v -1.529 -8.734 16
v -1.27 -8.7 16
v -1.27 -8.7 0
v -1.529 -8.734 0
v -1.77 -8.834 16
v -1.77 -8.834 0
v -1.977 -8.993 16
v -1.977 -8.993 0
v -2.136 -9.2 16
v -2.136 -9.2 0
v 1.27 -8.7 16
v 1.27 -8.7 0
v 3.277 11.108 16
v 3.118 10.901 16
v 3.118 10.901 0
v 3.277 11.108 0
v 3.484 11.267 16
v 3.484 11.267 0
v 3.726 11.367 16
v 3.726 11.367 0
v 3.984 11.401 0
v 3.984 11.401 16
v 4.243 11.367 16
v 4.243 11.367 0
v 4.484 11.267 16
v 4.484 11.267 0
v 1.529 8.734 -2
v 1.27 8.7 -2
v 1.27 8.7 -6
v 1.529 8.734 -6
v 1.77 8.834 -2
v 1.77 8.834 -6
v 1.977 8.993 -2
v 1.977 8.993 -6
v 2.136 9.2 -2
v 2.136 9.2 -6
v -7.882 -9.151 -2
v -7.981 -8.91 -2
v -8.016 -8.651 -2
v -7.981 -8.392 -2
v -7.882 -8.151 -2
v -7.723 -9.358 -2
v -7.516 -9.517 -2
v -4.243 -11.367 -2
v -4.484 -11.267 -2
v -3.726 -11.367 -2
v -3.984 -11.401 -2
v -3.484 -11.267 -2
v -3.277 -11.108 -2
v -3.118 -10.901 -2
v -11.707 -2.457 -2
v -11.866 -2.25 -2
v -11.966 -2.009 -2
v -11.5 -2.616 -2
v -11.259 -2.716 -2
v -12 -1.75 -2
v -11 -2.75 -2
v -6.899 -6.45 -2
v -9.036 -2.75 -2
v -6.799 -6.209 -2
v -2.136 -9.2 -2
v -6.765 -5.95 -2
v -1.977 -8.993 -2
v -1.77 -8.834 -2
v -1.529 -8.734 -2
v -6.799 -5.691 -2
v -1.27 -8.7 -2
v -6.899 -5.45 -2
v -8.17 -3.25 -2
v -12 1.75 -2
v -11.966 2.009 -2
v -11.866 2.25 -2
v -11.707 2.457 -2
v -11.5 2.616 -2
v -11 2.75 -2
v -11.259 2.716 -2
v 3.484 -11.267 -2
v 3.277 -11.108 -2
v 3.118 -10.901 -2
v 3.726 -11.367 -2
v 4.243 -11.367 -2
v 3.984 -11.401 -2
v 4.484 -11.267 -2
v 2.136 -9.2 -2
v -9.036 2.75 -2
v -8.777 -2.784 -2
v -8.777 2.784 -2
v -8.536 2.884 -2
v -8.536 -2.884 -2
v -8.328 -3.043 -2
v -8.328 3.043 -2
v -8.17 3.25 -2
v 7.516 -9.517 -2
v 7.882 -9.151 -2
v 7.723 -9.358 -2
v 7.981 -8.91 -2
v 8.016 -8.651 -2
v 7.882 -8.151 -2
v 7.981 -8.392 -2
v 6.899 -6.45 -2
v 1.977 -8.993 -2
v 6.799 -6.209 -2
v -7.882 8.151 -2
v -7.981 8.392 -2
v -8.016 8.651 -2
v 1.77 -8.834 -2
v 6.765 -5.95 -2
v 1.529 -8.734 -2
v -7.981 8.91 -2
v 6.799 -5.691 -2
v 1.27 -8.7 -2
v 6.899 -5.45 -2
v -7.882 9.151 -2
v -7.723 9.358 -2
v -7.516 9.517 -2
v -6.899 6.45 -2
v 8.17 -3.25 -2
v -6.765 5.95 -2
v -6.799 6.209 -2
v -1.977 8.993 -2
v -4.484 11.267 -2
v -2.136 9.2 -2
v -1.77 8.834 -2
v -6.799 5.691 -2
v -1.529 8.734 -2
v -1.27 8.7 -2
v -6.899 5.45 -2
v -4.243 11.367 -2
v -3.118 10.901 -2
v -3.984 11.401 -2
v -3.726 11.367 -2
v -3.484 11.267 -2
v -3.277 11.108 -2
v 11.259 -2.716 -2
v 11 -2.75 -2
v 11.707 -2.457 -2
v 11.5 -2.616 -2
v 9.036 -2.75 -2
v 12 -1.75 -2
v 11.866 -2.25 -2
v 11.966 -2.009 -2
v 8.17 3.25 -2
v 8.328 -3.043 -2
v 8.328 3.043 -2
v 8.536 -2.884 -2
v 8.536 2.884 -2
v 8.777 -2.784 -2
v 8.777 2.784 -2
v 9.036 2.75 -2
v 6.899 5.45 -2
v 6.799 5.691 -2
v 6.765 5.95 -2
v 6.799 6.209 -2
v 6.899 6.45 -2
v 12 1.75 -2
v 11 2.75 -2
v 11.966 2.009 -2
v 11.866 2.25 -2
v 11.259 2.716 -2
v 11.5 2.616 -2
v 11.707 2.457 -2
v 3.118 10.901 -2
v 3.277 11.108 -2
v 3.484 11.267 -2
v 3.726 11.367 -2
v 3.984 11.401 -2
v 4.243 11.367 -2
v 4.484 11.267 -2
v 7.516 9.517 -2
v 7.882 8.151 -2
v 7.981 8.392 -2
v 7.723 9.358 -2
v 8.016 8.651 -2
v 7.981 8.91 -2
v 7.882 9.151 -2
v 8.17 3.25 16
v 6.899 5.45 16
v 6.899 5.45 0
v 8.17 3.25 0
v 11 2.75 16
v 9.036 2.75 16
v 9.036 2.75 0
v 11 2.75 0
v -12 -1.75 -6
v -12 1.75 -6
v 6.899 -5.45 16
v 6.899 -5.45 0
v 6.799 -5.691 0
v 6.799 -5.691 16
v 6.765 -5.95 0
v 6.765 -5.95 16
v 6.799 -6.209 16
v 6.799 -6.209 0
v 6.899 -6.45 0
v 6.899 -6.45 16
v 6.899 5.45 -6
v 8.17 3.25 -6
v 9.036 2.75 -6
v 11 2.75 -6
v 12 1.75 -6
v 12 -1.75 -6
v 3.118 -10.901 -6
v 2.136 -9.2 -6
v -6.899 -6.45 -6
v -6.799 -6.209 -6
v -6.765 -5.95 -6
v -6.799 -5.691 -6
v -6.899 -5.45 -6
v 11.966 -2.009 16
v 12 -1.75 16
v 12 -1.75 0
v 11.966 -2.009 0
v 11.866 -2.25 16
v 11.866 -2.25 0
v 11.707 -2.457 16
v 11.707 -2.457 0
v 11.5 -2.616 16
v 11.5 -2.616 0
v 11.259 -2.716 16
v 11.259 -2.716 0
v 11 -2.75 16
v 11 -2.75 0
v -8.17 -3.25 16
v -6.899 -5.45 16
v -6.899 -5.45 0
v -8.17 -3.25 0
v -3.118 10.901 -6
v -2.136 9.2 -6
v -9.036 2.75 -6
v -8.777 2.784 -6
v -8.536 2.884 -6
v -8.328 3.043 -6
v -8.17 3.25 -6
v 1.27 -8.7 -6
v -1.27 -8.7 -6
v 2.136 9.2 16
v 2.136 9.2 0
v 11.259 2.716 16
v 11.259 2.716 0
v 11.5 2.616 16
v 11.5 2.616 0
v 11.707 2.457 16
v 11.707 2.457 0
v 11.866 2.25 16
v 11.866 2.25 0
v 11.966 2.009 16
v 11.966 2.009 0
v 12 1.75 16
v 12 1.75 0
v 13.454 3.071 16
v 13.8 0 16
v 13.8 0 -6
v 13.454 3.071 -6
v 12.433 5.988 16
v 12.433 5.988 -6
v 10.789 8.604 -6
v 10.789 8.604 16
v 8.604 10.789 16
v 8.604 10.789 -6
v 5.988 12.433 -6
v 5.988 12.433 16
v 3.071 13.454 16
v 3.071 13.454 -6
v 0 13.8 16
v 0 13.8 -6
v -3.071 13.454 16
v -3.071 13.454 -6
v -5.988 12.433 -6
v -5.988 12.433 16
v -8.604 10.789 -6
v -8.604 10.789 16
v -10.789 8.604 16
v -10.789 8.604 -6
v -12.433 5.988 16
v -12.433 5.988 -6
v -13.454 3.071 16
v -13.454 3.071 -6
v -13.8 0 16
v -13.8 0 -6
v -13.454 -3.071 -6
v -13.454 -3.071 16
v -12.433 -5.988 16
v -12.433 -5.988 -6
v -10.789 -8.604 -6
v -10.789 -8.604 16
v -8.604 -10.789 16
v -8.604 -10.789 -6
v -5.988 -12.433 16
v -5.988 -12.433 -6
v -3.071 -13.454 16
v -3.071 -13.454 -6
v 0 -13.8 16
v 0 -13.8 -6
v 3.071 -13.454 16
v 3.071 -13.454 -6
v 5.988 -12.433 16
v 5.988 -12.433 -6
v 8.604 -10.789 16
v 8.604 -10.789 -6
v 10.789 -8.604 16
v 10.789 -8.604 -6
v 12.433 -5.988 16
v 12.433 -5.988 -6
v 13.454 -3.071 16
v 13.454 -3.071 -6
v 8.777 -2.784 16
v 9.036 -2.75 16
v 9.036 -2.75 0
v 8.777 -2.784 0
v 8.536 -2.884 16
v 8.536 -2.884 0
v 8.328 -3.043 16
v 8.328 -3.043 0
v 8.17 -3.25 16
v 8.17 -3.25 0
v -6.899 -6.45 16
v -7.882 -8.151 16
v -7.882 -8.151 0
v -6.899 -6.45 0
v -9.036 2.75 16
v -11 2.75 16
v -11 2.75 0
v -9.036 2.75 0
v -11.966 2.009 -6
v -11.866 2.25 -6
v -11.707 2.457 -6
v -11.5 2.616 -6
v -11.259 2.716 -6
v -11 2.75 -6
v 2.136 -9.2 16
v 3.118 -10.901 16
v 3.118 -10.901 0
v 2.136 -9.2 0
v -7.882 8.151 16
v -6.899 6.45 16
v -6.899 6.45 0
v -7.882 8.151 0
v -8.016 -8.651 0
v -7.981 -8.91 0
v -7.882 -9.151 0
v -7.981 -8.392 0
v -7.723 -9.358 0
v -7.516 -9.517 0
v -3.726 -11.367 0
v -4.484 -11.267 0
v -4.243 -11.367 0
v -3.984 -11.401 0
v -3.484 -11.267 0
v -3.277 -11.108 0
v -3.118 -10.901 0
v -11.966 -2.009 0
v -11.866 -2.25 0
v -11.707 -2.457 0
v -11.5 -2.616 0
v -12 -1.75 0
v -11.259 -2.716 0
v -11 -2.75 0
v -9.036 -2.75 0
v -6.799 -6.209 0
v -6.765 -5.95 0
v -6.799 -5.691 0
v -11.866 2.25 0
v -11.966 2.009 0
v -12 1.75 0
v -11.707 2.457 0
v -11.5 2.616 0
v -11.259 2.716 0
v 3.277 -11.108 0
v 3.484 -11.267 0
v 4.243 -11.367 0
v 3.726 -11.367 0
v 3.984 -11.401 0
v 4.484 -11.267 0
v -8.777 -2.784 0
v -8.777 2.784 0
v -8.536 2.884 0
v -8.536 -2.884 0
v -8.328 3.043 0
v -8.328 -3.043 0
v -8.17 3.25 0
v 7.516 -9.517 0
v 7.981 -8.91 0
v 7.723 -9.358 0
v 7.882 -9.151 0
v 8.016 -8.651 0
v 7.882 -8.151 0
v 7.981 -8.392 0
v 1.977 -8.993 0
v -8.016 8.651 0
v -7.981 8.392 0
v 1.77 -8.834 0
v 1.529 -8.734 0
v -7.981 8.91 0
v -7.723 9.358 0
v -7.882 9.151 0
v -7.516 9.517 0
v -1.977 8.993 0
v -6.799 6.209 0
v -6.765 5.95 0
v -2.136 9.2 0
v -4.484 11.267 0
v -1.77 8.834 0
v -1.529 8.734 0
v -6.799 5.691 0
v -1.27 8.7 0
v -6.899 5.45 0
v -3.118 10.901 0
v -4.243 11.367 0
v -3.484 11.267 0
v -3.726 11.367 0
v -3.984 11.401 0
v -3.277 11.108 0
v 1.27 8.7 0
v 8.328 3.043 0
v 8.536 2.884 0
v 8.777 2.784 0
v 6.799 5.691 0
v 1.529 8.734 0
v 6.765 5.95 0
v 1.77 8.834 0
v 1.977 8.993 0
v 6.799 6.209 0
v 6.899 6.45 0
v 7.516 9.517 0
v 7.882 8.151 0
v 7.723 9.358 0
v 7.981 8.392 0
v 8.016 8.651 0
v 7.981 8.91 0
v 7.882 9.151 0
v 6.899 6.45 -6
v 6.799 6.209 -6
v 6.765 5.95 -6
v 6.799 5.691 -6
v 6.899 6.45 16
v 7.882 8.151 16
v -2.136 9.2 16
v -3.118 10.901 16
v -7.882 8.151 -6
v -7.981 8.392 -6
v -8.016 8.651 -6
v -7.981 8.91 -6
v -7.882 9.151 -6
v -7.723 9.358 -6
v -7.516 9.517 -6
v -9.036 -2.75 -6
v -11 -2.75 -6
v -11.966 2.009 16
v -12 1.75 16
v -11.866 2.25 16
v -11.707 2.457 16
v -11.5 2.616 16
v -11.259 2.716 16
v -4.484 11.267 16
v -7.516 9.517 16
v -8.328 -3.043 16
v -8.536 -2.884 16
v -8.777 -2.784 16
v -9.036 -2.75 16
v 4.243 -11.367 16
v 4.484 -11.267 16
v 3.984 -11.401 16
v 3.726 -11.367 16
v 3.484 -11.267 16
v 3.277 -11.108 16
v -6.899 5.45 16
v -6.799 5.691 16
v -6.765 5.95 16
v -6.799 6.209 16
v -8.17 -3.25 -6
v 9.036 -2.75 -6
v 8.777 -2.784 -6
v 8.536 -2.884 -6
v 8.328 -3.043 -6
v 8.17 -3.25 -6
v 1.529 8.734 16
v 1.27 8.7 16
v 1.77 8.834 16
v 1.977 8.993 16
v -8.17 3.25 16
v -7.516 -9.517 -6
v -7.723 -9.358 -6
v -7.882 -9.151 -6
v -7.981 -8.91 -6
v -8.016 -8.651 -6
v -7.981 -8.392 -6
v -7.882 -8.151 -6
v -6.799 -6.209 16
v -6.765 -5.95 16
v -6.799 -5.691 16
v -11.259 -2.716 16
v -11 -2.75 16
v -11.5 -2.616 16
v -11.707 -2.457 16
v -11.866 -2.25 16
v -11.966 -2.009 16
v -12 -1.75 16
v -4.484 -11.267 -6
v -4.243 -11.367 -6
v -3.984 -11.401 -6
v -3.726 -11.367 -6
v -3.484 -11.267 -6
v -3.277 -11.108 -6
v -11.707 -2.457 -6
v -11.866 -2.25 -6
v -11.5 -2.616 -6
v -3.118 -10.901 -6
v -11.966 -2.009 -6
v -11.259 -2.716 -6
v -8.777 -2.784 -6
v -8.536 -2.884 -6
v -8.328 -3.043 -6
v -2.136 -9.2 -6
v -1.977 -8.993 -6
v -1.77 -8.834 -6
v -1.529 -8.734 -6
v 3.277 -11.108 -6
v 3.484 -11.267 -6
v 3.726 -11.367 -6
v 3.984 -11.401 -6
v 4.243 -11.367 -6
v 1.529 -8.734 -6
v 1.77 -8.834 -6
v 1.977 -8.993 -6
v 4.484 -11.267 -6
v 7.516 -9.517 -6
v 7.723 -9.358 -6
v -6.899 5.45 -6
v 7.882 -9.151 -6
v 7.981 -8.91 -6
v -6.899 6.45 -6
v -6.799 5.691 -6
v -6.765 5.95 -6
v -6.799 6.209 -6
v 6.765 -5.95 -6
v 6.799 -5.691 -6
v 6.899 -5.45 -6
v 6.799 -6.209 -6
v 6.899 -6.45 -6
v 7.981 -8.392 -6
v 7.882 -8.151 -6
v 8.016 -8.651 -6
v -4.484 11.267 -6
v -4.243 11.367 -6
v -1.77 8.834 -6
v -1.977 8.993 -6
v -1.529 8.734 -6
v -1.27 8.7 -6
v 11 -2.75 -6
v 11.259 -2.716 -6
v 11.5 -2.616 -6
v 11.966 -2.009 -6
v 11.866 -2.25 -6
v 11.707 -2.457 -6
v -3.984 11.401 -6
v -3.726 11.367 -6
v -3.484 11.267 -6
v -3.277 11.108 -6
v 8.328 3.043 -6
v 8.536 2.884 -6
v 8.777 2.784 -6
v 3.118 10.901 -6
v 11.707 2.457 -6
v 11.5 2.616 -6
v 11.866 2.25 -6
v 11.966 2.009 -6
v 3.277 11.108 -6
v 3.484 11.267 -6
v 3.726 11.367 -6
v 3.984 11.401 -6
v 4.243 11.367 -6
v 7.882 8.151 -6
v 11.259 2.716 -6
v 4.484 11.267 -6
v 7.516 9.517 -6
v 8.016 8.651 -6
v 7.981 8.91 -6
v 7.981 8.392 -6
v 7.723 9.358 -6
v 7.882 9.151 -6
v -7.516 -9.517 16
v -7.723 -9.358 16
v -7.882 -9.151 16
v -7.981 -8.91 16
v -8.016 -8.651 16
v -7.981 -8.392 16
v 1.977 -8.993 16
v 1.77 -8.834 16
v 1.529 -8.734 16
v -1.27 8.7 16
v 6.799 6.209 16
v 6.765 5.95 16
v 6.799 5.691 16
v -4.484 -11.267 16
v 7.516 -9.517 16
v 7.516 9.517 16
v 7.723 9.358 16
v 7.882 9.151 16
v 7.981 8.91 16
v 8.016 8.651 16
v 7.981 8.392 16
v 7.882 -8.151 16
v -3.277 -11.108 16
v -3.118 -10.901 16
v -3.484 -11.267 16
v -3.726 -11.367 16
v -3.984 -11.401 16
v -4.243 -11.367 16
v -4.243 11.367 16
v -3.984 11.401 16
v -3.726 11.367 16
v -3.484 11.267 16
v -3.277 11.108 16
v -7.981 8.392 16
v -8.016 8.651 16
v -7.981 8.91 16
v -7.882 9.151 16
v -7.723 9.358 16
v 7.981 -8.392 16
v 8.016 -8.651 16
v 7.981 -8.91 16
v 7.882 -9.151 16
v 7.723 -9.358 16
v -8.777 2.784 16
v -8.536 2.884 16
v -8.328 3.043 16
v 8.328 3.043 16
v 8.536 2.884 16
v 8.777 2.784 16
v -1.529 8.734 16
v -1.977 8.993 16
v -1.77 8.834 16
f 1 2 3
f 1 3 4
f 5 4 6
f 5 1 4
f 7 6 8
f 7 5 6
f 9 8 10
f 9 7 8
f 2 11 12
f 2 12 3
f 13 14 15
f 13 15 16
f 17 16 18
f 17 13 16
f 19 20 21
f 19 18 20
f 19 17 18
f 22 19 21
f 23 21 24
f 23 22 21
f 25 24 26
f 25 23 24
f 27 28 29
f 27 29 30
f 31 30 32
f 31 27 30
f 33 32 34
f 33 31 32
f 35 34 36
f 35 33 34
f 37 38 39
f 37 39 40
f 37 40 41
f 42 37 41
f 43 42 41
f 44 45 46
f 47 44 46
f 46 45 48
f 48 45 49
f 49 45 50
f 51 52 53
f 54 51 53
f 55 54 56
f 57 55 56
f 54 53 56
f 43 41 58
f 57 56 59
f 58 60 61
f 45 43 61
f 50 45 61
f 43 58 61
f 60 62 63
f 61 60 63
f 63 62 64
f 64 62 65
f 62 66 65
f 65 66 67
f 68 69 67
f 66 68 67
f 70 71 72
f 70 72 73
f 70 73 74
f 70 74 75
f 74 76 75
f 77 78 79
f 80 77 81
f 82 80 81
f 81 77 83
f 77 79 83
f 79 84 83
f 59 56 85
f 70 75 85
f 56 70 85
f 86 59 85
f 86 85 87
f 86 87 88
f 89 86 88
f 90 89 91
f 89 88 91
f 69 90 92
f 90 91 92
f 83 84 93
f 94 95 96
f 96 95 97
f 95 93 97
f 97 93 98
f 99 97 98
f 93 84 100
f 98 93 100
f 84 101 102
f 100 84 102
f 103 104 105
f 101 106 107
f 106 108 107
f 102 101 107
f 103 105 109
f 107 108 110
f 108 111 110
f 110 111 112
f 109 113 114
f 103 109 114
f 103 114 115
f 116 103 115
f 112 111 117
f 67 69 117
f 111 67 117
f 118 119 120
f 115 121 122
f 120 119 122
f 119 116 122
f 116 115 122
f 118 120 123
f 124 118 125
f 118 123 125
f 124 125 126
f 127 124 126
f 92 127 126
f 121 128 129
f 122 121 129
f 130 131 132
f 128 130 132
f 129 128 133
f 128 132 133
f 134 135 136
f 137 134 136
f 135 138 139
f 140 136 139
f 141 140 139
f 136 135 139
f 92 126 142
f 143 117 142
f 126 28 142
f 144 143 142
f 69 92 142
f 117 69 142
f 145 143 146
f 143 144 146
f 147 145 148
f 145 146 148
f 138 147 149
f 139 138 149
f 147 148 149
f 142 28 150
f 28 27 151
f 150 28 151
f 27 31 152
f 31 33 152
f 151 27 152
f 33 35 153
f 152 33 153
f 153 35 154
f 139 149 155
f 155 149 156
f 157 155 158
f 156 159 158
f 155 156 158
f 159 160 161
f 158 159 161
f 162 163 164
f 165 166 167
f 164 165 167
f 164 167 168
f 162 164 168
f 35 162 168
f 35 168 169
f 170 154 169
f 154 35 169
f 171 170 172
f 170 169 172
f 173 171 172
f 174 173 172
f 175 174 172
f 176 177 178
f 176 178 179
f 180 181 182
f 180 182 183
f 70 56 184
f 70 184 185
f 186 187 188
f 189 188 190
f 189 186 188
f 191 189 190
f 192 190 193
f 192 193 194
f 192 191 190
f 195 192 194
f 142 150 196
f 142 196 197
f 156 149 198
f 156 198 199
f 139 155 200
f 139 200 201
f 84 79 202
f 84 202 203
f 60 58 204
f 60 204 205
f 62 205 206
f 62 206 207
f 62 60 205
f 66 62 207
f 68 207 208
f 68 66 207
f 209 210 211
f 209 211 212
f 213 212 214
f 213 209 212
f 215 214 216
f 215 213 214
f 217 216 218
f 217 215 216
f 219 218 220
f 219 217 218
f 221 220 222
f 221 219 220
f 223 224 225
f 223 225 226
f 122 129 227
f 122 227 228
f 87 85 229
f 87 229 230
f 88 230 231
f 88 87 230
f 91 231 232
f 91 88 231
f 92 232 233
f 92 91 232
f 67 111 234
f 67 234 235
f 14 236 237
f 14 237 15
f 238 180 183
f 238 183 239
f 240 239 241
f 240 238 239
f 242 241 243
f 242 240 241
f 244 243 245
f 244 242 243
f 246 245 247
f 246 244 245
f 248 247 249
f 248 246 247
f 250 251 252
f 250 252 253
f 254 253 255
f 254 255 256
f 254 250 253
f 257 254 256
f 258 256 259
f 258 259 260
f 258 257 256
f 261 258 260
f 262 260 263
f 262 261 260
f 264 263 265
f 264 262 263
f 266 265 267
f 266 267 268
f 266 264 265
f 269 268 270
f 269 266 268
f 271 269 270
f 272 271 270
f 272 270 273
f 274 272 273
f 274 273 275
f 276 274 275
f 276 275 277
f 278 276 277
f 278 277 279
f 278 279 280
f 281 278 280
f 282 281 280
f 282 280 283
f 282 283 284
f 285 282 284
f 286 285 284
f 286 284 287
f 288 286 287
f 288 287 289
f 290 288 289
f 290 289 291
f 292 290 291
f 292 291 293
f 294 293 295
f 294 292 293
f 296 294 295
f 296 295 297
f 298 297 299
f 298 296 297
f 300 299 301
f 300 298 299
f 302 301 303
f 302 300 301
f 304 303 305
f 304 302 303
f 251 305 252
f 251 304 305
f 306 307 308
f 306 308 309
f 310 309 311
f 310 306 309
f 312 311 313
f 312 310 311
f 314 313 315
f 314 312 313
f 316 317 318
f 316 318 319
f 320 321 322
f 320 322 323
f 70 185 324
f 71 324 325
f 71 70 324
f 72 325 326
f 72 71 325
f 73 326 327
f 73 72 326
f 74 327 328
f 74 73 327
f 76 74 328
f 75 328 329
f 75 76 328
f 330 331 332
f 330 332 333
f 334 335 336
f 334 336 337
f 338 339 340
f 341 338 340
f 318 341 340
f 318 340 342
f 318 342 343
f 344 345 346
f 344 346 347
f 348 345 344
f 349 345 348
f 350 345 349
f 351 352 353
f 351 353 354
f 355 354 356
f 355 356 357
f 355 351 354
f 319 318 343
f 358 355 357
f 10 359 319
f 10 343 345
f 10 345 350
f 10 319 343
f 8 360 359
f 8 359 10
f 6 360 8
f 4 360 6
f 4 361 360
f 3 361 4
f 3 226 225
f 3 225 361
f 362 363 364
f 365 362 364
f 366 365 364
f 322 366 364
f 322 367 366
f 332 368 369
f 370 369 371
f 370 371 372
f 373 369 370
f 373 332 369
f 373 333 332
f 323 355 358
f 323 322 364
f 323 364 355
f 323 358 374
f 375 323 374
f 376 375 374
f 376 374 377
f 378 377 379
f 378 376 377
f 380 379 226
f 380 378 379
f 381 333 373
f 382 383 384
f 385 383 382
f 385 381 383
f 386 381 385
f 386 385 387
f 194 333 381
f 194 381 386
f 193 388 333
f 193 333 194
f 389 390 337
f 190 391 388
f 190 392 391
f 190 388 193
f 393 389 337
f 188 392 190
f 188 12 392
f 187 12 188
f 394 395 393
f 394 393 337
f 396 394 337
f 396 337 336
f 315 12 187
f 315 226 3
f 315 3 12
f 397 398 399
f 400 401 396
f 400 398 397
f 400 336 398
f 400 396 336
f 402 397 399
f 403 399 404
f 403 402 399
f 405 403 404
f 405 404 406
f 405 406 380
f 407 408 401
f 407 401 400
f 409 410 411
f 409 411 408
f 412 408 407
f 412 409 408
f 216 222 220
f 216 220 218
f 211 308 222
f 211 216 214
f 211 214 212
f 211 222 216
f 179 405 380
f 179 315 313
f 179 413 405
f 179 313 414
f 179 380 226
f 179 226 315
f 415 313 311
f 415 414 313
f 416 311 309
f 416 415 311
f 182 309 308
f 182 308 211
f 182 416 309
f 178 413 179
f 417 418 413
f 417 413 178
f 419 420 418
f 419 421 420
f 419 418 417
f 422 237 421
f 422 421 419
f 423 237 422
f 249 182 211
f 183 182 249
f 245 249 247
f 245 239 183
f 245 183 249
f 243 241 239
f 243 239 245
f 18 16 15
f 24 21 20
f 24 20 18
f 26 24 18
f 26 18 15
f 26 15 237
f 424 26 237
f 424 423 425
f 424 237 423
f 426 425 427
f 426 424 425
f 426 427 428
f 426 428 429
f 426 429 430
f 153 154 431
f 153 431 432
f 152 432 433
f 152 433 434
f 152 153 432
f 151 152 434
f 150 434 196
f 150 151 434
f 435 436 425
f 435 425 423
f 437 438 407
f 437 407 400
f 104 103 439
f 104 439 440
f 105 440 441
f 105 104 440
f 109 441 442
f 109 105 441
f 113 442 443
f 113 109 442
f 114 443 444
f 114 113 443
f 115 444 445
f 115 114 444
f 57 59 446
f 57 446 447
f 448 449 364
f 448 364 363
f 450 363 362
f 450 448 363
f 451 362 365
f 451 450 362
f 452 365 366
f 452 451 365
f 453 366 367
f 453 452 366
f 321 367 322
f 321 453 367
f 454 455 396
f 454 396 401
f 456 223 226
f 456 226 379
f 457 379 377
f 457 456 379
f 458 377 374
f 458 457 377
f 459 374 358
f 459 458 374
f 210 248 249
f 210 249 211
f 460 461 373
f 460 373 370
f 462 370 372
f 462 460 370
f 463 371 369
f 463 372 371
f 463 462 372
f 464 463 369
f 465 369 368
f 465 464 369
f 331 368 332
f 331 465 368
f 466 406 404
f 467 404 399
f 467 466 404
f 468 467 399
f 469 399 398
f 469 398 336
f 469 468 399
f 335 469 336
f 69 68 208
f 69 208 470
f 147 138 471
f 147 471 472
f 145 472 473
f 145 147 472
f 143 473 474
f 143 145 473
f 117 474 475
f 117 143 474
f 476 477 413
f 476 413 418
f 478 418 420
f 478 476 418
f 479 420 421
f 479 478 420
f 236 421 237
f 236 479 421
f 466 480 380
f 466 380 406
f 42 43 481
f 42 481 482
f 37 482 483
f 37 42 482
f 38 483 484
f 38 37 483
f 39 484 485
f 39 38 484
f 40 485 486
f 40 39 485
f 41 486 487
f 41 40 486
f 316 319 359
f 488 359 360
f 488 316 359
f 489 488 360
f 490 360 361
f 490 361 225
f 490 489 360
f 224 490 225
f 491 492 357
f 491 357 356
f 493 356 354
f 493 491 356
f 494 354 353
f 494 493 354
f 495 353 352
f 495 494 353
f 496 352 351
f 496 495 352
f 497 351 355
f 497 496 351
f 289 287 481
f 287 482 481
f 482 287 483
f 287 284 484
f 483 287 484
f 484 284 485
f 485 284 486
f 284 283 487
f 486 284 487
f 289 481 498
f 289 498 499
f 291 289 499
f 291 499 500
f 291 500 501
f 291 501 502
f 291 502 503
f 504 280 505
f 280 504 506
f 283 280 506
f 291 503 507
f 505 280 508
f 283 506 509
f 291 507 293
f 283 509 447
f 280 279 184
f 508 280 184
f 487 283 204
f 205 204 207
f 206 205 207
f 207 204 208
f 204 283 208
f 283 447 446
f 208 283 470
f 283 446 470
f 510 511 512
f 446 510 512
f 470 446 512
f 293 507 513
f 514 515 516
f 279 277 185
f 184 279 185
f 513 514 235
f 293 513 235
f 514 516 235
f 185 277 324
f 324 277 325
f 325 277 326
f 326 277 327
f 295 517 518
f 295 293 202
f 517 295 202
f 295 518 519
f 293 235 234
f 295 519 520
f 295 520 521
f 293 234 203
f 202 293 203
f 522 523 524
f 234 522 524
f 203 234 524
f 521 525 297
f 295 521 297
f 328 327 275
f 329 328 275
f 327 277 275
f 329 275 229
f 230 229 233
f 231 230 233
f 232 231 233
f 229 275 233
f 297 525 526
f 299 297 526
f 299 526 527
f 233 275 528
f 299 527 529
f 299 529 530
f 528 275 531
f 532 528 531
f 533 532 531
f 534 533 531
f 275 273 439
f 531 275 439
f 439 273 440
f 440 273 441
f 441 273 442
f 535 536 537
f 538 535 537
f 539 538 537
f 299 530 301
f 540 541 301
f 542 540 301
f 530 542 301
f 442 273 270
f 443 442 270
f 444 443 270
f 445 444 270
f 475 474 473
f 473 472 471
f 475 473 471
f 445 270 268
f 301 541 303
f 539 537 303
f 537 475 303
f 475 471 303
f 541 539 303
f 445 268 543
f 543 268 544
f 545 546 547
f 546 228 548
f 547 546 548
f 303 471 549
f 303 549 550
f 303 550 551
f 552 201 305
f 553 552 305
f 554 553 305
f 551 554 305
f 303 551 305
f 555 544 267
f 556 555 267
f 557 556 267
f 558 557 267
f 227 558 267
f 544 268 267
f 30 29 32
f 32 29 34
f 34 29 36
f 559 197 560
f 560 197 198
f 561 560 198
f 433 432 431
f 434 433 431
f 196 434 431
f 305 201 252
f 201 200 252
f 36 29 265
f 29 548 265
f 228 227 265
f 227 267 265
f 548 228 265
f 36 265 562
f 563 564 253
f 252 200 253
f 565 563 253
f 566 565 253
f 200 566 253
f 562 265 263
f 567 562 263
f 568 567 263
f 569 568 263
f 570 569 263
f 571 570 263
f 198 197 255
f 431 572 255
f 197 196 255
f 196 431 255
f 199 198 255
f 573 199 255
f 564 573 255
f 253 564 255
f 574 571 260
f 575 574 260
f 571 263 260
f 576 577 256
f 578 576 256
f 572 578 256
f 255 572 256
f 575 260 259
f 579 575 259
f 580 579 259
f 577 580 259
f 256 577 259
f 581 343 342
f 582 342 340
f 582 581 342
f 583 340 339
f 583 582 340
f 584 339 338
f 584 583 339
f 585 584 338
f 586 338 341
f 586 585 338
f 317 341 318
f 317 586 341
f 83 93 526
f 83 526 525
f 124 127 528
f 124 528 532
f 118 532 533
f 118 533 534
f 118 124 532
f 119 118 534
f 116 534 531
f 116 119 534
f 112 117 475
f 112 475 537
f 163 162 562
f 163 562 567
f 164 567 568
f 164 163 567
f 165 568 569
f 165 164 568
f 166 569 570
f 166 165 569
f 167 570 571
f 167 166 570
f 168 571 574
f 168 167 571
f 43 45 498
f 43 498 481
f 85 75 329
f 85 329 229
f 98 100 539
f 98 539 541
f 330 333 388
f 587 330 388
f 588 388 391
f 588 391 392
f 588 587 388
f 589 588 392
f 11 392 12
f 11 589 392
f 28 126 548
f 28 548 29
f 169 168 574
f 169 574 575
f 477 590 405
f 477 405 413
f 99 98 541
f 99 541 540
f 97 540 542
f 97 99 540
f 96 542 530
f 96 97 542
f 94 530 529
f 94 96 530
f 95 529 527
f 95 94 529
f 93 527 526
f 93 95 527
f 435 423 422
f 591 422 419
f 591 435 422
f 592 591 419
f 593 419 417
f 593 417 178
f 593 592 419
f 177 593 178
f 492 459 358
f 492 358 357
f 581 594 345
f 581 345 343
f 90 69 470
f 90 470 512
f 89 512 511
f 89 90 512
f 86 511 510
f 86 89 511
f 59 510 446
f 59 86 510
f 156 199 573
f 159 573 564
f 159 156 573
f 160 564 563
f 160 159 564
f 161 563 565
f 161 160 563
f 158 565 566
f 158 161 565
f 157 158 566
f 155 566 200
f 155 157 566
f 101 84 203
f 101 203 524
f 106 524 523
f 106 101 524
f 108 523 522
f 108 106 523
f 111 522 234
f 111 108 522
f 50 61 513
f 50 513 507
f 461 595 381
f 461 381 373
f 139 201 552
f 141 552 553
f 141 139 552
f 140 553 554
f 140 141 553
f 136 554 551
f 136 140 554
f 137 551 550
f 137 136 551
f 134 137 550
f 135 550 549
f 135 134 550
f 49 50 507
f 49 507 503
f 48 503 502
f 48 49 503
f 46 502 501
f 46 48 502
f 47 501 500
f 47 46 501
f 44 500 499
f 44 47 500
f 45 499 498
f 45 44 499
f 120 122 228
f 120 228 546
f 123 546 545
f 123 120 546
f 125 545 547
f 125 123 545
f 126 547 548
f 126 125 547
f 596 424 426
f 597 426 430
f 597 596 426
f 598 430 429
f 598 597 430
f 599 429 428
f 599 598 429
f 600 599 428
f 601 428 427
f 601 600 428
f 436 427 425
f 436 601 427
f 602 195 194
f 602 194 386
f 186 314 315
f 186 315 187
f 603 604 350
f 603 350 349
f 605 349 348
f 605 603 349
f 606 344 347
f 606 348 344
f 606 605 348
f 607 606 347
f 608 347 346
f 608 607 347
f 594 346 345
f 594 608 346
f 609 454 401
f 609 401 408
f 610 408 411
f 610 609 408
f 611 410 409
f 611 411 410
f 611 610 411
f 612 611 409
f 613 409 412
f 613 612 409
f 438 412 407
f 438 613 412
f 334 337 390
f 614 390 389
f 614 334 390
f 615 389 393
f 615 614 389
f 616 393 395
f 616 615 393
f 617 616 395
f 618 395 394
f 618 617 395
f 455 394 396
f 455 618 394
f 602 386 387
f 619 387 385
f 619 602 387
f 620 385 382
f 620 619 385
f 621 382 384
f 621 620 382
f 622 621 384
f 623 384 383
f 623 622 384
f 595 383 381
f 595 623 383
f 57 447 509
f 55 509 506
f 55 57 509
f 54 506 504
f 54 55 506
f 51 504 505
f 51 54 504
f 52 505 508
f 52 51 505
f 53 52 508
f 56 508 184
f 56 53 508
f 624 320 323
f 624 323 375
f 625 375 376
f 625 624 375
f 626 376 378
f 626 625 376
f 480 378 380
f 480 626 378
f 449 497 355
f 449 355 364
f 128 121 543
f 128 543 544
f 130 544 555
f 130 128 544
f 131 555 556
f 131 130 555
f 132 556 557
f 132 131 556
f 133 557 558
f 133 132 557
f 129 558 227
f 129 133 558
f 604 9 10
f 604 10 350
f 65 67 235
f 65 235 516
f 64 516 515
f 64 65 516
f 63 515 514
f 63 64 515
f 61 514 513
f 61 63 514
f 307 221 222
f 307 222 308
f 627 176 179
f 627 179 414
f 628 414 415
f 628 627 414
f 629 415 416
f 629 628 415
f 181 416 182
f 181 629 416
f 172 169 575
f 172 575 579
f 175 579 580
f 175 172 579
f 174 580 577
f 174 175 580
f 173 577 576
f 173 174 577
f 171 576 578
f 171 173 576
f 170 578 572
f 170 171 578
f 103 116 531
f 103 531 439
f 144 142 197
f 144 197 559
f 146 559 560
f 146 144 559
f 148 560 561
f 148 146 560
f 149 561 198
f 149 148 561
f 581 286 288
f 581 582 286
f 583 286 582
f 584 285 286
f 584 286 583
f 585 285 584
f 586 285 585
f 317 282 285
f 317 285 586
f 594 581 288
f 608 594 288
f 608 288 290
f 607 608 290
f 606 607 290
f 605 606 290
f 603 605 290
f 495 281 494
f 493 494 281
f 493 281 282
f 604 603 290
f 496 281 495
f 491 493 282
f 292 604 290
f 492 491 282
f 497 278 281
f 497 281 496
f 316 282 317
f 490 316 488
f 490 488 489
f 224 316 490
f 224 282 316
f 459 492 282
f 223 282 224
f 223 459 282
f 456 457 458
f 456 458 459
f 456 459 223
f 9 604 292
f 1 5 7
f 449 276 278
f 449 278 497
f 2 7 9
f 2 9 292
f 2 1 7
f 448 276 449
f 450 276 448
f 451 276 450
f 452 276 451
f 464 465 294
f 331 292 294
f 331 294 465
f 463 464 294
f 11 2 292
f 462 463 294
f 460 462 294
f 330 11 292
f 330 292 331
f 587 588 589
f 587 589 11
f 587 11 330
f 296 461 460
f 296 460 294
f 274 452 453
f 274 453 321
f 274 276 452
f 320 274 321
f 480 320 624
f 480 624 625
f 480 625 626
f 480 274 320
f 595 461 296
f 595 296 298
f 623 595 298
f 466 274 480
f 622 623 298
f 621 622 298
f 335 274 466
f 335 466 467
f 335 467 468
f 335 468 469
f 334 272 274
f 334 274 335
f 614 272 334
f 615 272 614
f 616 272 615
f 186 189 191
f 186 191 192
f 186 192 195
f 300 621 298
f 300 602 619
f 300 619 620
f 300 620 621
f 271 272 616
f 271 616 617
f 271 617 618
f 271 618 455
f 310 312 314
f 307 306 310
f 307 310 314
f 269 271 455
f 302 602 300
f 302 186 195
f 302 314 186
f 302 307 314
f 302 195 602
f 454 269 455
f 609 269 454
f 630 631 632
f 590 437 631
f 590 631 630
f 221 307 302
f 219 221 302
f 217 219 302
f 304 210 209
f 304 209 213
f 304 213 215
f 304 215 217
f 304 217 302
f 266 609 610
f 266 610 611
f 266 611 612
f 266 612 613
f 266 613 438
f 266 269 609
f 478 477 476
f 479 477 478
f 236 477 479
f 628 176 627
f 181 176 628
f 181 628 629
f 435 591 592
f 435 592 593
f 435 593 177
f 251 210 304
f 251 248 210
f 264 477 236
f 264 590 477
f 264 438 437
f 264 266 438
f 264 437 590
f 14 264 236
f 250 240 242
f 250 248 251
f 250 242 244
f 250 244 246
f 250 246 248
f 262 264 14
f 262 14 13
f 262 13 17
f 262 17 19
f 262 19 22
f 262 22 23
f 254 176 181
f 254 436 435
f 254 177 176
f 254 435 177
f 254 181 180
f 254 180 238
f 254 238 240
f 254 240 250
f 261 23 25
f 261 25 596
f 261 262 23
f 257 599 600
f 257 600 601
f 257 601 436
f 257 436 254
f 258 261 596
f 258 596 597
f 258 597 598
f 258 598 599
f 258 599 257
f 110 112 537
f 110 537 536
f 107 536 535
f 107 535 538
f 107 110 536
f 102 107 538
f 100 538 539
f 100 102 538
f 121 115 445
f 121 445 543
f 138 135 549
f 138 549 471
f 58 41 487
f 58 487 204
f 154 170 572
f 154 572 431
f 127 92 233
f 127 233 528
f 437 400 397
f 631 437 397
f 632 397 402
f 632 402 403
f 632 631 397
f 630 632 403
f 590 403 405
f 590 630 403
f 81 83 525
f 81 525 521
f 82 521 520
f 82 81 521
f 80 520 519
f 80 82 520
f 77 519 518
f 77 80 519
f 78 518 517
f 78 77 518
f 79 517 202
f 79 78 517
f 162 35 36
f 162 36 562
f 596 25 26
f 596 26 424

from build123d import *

# Parameters (mm, degrees)
F0_R          = 13.8
F1_DEPTH      = 16
F1_DEPTH_BACK = 6
F2_R          = 13.8
F3_DEPTH      = 2


with BuildPart() as f1:
    # F0 (on Top) → F1 (new body, two sides)
    with BuildSketch(Plane.XY) as f1_sk:
        Circle(F0_R)
        with BuildLine():
            Line((-1.270171, 8.7), (0, 8.7))
            Line((0, 8.7), (1.270171, 8.7))
            ThreePointArc((1.270171, 8.7), (1.770171, 8.833975), (2.136196, 9.2))
            Line((2.136196, 9.2), (3.11843, 10.901279))
            ThreePointArc((3.11843, 10.901279), (3.725636, 11.367205), (4.484456, 11.267305))
            Line((4.484456, 11.267305), (6, 10.392305))
            Line((6, 10.392305), (7.515544, 9.517305))
            ThreePointArc((7.515544, 9.517305), (7.98147, 8.910098), (7.88157, 8.151279))
            Line((7.88157, 8.151279), (6.899336, 6.45))
            ThreePointArc((6.899336, 6.45), (6.765361, 5.95), (6.899336, 5.45))
            Line((6.899336, 5.45), (7.534421, 4.35))
            Line((7.534421, 4.35), (8.169506, 3.25))
            ThreePointArc((8.169506, 3.25), (8.535532, 2.883975), (9.035532, 2.75))
            Line((9.035532, 2.75), (11, 2.75))
            ThreePointArc((11, 2.75), (11.707107, 2.457107), (12, 1.75))
            Line((12, 1.75), (12, 0))
            Line((12, 0), (12, -1.75))
            ThreePointArc((12, -1.75), (11.707107, -2.457107), (11, -2.75))
            Line((11, -2.75), (9.035532, -2.75))
            ThreePointArc((9.035532, -2.75), (8.535532, -2.883975), (8.169506, -3.25))
            Line((8.169506, -3.25), (7.534421, -4.35))
            Line((7.534421, -4.35), (6.899336, -5.45))
            ThreePointArc((6.899336, -5.45), (6.765361, -5.95), (6.899336, -6.45))
            Line((6.899336, -6.45), (7.88157, -8.151279))
            ThreePointArc((7.88157, -8.151279), (7.98147, -8.910098), (7.515544, -9.517305))
            Line((7.515544, -9.517305), (6, -10.392305))
            Line((6, -10.392305), (4.484456, -11.267305))
            ThreePointArc((4.484456, -11.267305), (3.725636, -11.367205), (3.11843, -10.901279))
            Line((3.11843, -10.901279), (2.136196, -9.2))
            ThreePointArc((2.136196, -9.2), (1.770171, -8.833975), (1.270171, -8.7))
            Line((1.270171, -8.7), (0, -8.7))
            Line((0, -8.7), (-1.270171, -8.7))
            ThreePointArc((-1.270171, -8.7), (-1.770171, -8.833975), (-2.136196, -9.2))
            Line((-2.136196, -9.2), (-3.11843, -10.901279))
            ThreePointArc((-3.11843, -10.901279), (-3.725636, -11.367205), (-4.484456, -11.267305))
            Line((-4.484456, -11.267305), (-6, -10.392305))
            Line((-6, -10.392305), (-7.515544, -9.517305))
            ThreePointArc((-7.515544, -9.517305), (-7.98147, -8.910098), (-7.88157, -8.151279))
            Line((-7.88157, -8.151279), (-6.899336, -6.45))
            ThreePointArc((-6.899336, -6.45), (-6.765361, -5.95), (-6.899336, -5.45))
            Line((-6.899336, -5.45), (-7.534421, -4.35))
            Line((-7.534421, -4.35), (-8.169506, -3.25))
            ThreePointArc((-8.169506, -3.25), (-8.535532, -2.883975), (-9.035532, -2.75))
            Line((-9.035532, -2.75), (-11, -2.75))
            ThreePointArc((-11, -2.75), (-11.707107, -2.457107), (-12, -1.75))
            Line((-12, -1.75), (-12, 0))
            Line((-12, 0), (-12, 1.75))
            ThreePointArc((-12, 1.75), (-11.707107, 2.457107), (-11, 2.75))
            Line((-11, 2.75), (-9.035532, 2.75))
            ThreePointArc((-9.035532, 2.75), (-8.535532, 2.883975), (-8.169506, 3.25))
            Line((-8.169506, 3.25), (-7.534421, 4.35))
            Line((-7.534421, 4.35), (-6.899336, 5.45))
            ThreePointArc((-6.899336, 5.45), (-6.765361, 5.95), (-6.899336, 6.45))
            Line((-6.899336, 6.45), (-7.88157, 8.151279))
            ThreePointArc((-7.88157, 8.151279), (-7.98147, 8.910098), (-7.515544, 9.517305))
            Line((-7.515544, 9.517305), (-6, 10.392305))
            Line((-6, 10.392305), (-4.484456, 11.267305))
            ThreePointArc((-4.484456, 11.267305), (-3.725636, 11.367205), (-3.11843, 10.901279))
            Line((-3.11843, 10.901279), (-2.136196, 9.2))
            ThreePointArc((-2.136196, 9.2), (-1.770171, 8.833975), (-1.270171, 8.7))
        make_face(mode=Mode.SUBTRACT)
    extrude(amount=F1_DEPTH)
    extrude(f1_sk.sketch, amount=-F1_DEPTH_BACK)

    # F2 (on Top) → F3 (join)
    with BuildSketch(Plane.XY):
        Circle(F2_R)
    extrude(amount=-F3_DEPTH)


solid = f1.part
